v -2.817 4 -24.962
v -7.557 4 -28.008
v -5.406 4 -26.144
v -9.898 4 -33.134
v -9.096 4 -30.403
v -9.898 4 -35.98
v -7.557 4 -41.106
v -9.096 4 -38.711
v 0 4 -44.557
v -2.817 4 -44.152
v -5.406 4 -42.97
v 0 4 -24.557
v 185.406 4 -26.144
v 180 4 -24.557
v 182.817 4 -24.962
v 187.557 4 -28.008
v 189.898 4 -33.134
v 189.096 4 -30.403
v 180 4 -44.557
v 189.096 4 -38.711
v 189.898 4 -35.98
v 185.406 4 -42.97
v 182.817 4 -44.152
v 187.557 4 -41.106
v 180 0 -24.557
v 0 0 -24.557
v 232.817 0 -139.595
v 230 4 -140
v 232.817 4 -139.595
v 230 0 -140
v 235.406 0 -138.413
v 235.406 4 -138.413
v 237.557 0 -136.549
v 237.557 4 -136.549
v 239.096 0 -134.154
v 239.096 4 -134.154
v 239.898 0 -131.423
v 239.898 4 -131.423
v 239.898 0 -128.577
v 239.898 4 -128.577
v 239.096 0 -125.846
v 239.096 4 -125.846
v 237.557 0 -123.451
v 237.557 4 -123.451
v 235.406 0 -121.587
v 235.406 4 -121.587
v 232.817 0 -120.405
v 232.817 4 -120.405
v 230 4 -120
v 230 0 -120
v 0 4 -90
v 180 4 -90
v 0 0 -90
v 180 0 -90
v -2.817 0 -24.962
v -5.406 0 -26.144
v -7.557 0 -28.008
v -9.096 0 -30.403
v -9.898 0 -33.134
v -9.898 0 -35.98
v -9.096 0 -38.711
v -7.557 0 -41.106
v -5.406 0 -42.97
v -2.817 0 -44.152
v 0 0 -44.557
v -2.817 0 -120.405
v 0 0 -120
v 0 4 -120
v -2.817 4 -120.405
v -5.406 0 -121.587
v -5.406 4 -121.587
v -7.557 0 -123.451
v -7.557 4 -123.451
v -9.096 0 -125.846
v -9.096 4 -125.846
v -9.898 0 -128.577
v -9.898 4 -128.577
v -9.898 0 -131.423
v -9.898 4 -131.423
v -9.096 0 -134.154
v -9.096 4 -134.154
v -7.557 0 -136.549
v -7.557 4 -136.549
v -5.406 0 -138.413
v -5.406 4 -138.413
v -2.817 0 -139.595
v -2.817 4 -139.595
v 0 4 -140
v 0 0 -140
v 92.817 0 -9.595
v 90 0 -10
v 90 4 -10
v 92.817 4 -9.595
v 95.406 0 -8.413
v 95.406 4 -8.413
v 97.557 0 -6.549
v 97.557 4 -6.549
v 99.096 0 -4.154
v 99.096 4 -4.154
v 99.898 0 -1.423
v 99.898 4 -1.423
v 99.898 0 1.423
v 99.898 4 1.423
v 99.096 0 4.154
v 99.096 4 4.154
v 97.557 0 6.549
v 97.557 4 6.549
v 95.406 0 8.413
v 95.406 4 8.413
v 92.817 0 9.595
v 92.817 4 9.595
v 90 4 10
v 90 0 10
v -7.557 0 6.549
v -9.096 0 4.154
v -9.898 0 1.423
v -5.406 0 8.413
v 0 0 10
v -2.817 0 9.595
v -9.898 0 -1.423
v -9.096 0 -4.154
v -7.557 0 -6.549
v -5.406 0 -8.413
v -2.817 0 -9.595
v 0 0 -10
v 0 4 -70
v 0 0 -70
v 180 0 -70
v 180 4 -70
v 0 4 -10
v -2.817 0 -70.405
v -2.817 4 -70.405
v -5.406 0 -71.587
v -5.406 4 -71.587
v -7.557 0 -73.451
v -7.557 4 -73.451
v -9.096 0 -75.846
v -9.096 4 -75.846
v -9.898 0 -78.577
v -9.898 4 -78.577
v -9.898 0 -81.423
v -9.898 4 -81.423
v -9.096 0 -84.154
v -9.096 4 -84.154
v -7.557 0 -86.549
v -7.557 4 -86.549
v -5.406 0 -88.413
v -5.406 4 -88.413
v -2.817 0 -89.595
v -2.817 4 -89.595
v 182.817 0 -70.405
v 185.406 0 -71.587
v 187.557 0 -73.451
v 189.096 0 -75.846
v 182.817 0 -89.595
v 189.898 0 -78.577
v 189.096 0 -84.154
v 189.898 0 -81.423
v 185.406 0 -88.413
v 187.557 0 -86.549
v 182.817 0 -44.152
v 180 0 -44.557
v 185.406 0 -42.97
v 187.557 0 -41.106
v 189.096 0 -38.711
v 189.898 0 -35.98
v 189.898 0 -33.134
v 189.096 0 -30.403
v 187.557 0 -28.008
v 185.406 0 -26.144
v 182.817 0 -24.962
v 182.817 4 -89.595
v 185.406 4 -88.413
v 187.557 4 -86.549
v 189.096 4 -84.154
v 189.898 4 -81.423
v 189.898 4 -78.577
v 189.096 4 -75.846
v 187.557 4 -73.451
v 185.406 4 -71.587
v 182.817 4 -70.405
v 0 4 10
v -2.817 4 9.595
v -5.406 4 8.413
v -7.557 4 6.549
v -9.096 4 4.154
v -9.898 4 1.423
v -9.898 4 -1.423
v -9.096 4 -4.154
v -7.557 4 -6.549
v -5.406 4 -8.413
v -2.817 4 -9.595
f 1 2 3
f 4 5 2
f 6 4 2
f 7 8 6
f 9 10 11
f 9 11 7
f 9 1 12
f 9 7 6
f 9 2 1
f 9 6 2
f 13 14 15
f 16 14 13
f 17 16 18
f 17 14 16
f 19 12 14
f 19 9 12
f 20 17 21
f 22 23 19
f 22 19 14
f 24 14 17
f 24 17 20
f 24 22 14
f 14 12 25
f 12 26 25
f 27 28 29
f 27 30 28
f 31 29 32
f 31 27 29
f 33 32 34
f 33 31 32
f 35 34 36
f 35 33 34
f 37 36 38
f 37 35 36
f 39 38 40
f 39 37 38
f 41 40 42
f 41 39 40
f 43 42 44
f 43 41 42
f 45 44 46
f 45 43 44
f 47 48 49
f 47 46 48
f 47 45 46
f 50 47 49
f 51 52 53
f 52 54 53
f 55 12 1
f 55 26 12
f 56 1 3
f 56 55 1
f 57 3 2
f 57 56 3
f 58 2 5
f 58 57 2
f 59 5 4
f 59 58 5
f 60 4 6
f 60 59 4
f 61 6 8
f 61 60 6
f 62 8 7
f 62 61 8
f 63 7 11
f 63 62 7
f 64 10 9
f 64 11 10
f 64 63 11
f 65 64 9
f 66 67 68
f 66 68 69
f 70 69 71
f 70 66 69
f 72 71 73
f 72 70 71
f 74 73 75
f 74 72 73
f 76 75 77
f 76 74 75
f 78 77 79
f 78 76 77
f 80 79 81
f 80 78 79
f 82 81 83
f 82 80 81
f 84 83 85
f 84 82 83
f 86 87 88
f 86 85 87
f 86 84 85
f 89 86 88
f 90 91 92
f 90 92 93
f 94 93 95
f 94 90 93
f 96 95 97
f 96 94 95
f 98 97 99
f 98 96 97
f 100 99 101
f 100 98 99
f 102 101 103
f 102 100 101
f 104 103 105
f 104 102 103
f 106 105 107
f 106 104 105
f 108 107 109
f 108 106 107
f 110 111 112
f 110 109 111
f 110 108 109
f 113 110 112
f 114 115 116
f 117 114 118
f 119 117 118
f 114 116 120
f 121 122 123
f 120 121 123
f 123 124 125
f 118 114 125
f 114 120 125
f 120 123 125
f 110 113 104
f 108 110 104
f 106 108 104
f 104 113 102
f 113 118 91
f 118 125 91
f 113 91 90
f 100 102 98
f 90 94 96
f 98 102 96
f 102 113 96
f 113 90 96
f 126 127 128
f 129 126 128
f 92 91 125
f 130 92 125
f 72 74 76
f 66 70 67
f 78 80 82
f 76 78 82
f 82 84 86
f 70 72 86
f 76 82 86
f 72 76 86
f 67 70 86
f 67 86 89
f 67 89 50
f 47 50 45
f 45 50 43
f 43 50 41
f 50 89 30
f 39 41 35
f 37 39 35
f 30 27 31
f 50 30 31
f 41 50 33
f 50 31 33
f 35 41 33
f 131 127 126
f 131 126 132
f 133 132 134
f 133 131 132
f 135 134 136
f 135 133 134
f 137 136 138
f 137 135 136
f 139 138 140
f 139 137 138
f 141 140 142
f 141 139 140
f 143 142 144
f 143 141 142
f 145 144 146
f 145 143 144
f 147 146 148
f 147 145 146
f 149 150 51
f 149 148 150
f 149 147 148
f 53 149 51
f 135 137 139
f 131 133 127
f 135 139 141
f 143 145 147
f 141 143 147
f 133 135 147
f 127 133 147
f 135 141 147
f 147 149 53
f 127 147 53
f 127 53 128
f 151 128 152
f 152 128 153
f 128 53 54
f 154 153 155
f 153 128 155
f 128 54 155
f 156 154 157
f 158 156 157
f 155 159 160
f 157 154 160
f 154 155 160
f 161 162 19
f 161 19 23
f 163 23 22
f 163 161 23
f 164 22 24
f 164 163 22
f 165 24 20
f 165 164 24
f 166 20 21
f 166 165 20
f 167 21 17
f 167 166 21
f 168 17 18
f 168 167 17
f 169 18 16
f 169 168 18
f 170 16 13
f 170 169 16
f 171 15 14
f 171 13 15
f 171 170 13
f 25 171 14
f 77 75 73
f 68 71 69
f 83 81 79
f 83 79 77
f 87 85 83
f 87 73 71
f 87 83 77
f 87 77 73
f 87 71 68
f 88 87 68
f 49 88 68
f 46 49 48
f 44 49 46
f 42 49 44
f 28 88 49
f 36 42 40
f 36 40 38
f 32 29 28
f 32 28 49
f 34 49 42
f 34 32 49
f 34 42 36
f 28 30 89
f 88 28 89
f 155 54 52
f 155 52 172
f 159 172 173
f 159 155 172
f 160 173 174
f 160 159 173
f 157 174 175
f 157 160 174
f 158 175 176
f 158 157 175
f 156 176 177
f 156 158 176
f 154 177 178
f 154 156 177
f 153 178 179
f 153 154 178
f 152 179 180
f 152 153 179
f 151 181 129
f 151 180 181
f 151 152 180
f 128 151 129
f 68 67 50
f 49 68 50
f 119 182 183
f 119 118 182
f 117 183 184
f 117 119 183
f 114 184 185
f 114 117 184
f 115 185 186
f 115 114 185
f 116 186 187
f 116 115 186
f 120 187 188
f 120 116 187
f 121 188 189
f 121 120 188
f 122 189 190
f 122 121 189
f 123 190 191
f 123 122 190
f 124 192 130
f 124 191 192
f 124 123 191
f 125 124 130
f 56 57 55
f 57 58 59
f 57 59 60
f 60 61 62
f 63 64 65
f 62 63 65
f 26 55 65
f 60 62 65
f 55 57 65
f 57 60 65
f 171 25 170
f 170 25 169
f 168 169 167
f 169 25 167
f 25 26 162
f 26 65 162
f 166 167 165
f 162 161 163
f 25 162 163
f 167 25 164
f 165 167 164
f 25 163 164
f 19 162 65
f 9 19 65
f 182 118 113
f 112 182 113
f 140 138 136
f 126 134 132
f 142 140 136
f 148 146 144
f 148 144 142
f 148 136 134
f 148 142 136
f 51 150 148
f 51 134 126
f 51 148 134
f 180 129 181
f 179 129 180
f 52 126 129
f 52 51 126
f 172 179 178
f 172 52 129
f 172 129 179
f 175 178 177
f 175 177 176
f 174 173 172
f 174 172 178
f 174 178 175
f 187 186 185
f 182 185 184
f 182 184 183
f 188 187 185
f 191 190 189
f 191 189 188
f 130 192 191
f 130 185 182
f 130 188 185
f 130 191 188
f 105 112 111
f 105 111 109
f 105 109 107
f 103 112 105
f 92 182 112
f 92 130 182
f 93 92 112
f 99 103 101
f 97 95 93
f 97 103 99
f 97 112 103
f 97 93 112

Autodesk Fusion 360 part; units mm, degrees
sketch "Sketch1" plane through (0, 0, 0) normal (0, 1, 0) x (1, 0, 0)
  line L0 (0, -10) -> (90, -10)
  arc A0 (90, -10) -> (90, 10) centre (90, 0) ccw
  line L1 (90, 10) -> (0, 10)
  arc A1 (0, 10) -> (0, -10) centre (0, 0) ccw
  line L2 (0, 0) -> (90, 0) construction
  line L3 (0, 24.557) -> (180, 24.557)
  arc A2 (180, 24.557) -> (180, 44.557) centre (180, 34.557) ccw
  line L4 (180, 44.557) -> (0, 44.557)
  arc A3 (0, 44.557) -> (0, 24.557) centre (0, 34.557) ccw
  line L5 (0, 34.557) -> (180, 34.557) construction
  line L6 (0, 70) -> (180, 70)
  arc A4 (180, 70) -> (180, 90) centre (180, 80) ccw
  line L7 (180, 90) -> (0, 90)
  arc A5 (0, 90) -> (0, 70) centre (0, 80) ccw
  line L8 (0, 80) -> (180, 80) construction
  line L9 (0, 120) -> (230, 120)
  arc A6 (230, 120) -> (230, 140) centre (230, 130) ccw
  line L10 (230, 140) -> (0, 140)
  arc A7 (0, 140) -> (0, 120) centre (0, 130) ccw
  line L11 (0, 130) -> (230, 130) construction
  dimension "d1" = 20
extrude "Extrude1" add sketch "Sketch1" along normal blind 4 makes body 1 at (120, 0, -31.2236) makes body 2 at (120, 0, -76.6667) makes body 3 at (60, 0, 3.3333) makes body 4 at (76.6667, 0, -126.6667) in component "Component"
copy_body "Body->Comp1" bodies 1 removing the originals makes body 5 in component "Component'"
copy_body "Body->Comp2" bodies 2 removing the originals makes body 6 in component "Component''"
copy_body "Body->Comp3" bodies 3 removing the originals makes body 7 in component "Component'''"
copy_body "Body->Comp4" bodies 4 removing the originals makes body 8 in component "Component''''"
component "Component" placed x (1, 0, 0) y (0, 1, 0) z (0, 0, 1) at (0, 0, 0)
component "Component'" placed x (1, 0, 0) y (0, 1, 0) z (0, 0, 1) at (0, 0, 0) in component "Component"
component "Component''" placed x (1, 0, 0) y (0, 1, 0) z (0, 0, 1) at (0, 0, 0) in component "Component"
component "Component'''" placed x (1, 0, 0) y (0, 1, 0) z (0, 0, 1) at (0, 0, 0) in component "Component"
component "Component''''" placed x (1, 0, 0) y (0, 1, 0) z (0, 0, 1) at (0, 0, 0) in component "Component"
